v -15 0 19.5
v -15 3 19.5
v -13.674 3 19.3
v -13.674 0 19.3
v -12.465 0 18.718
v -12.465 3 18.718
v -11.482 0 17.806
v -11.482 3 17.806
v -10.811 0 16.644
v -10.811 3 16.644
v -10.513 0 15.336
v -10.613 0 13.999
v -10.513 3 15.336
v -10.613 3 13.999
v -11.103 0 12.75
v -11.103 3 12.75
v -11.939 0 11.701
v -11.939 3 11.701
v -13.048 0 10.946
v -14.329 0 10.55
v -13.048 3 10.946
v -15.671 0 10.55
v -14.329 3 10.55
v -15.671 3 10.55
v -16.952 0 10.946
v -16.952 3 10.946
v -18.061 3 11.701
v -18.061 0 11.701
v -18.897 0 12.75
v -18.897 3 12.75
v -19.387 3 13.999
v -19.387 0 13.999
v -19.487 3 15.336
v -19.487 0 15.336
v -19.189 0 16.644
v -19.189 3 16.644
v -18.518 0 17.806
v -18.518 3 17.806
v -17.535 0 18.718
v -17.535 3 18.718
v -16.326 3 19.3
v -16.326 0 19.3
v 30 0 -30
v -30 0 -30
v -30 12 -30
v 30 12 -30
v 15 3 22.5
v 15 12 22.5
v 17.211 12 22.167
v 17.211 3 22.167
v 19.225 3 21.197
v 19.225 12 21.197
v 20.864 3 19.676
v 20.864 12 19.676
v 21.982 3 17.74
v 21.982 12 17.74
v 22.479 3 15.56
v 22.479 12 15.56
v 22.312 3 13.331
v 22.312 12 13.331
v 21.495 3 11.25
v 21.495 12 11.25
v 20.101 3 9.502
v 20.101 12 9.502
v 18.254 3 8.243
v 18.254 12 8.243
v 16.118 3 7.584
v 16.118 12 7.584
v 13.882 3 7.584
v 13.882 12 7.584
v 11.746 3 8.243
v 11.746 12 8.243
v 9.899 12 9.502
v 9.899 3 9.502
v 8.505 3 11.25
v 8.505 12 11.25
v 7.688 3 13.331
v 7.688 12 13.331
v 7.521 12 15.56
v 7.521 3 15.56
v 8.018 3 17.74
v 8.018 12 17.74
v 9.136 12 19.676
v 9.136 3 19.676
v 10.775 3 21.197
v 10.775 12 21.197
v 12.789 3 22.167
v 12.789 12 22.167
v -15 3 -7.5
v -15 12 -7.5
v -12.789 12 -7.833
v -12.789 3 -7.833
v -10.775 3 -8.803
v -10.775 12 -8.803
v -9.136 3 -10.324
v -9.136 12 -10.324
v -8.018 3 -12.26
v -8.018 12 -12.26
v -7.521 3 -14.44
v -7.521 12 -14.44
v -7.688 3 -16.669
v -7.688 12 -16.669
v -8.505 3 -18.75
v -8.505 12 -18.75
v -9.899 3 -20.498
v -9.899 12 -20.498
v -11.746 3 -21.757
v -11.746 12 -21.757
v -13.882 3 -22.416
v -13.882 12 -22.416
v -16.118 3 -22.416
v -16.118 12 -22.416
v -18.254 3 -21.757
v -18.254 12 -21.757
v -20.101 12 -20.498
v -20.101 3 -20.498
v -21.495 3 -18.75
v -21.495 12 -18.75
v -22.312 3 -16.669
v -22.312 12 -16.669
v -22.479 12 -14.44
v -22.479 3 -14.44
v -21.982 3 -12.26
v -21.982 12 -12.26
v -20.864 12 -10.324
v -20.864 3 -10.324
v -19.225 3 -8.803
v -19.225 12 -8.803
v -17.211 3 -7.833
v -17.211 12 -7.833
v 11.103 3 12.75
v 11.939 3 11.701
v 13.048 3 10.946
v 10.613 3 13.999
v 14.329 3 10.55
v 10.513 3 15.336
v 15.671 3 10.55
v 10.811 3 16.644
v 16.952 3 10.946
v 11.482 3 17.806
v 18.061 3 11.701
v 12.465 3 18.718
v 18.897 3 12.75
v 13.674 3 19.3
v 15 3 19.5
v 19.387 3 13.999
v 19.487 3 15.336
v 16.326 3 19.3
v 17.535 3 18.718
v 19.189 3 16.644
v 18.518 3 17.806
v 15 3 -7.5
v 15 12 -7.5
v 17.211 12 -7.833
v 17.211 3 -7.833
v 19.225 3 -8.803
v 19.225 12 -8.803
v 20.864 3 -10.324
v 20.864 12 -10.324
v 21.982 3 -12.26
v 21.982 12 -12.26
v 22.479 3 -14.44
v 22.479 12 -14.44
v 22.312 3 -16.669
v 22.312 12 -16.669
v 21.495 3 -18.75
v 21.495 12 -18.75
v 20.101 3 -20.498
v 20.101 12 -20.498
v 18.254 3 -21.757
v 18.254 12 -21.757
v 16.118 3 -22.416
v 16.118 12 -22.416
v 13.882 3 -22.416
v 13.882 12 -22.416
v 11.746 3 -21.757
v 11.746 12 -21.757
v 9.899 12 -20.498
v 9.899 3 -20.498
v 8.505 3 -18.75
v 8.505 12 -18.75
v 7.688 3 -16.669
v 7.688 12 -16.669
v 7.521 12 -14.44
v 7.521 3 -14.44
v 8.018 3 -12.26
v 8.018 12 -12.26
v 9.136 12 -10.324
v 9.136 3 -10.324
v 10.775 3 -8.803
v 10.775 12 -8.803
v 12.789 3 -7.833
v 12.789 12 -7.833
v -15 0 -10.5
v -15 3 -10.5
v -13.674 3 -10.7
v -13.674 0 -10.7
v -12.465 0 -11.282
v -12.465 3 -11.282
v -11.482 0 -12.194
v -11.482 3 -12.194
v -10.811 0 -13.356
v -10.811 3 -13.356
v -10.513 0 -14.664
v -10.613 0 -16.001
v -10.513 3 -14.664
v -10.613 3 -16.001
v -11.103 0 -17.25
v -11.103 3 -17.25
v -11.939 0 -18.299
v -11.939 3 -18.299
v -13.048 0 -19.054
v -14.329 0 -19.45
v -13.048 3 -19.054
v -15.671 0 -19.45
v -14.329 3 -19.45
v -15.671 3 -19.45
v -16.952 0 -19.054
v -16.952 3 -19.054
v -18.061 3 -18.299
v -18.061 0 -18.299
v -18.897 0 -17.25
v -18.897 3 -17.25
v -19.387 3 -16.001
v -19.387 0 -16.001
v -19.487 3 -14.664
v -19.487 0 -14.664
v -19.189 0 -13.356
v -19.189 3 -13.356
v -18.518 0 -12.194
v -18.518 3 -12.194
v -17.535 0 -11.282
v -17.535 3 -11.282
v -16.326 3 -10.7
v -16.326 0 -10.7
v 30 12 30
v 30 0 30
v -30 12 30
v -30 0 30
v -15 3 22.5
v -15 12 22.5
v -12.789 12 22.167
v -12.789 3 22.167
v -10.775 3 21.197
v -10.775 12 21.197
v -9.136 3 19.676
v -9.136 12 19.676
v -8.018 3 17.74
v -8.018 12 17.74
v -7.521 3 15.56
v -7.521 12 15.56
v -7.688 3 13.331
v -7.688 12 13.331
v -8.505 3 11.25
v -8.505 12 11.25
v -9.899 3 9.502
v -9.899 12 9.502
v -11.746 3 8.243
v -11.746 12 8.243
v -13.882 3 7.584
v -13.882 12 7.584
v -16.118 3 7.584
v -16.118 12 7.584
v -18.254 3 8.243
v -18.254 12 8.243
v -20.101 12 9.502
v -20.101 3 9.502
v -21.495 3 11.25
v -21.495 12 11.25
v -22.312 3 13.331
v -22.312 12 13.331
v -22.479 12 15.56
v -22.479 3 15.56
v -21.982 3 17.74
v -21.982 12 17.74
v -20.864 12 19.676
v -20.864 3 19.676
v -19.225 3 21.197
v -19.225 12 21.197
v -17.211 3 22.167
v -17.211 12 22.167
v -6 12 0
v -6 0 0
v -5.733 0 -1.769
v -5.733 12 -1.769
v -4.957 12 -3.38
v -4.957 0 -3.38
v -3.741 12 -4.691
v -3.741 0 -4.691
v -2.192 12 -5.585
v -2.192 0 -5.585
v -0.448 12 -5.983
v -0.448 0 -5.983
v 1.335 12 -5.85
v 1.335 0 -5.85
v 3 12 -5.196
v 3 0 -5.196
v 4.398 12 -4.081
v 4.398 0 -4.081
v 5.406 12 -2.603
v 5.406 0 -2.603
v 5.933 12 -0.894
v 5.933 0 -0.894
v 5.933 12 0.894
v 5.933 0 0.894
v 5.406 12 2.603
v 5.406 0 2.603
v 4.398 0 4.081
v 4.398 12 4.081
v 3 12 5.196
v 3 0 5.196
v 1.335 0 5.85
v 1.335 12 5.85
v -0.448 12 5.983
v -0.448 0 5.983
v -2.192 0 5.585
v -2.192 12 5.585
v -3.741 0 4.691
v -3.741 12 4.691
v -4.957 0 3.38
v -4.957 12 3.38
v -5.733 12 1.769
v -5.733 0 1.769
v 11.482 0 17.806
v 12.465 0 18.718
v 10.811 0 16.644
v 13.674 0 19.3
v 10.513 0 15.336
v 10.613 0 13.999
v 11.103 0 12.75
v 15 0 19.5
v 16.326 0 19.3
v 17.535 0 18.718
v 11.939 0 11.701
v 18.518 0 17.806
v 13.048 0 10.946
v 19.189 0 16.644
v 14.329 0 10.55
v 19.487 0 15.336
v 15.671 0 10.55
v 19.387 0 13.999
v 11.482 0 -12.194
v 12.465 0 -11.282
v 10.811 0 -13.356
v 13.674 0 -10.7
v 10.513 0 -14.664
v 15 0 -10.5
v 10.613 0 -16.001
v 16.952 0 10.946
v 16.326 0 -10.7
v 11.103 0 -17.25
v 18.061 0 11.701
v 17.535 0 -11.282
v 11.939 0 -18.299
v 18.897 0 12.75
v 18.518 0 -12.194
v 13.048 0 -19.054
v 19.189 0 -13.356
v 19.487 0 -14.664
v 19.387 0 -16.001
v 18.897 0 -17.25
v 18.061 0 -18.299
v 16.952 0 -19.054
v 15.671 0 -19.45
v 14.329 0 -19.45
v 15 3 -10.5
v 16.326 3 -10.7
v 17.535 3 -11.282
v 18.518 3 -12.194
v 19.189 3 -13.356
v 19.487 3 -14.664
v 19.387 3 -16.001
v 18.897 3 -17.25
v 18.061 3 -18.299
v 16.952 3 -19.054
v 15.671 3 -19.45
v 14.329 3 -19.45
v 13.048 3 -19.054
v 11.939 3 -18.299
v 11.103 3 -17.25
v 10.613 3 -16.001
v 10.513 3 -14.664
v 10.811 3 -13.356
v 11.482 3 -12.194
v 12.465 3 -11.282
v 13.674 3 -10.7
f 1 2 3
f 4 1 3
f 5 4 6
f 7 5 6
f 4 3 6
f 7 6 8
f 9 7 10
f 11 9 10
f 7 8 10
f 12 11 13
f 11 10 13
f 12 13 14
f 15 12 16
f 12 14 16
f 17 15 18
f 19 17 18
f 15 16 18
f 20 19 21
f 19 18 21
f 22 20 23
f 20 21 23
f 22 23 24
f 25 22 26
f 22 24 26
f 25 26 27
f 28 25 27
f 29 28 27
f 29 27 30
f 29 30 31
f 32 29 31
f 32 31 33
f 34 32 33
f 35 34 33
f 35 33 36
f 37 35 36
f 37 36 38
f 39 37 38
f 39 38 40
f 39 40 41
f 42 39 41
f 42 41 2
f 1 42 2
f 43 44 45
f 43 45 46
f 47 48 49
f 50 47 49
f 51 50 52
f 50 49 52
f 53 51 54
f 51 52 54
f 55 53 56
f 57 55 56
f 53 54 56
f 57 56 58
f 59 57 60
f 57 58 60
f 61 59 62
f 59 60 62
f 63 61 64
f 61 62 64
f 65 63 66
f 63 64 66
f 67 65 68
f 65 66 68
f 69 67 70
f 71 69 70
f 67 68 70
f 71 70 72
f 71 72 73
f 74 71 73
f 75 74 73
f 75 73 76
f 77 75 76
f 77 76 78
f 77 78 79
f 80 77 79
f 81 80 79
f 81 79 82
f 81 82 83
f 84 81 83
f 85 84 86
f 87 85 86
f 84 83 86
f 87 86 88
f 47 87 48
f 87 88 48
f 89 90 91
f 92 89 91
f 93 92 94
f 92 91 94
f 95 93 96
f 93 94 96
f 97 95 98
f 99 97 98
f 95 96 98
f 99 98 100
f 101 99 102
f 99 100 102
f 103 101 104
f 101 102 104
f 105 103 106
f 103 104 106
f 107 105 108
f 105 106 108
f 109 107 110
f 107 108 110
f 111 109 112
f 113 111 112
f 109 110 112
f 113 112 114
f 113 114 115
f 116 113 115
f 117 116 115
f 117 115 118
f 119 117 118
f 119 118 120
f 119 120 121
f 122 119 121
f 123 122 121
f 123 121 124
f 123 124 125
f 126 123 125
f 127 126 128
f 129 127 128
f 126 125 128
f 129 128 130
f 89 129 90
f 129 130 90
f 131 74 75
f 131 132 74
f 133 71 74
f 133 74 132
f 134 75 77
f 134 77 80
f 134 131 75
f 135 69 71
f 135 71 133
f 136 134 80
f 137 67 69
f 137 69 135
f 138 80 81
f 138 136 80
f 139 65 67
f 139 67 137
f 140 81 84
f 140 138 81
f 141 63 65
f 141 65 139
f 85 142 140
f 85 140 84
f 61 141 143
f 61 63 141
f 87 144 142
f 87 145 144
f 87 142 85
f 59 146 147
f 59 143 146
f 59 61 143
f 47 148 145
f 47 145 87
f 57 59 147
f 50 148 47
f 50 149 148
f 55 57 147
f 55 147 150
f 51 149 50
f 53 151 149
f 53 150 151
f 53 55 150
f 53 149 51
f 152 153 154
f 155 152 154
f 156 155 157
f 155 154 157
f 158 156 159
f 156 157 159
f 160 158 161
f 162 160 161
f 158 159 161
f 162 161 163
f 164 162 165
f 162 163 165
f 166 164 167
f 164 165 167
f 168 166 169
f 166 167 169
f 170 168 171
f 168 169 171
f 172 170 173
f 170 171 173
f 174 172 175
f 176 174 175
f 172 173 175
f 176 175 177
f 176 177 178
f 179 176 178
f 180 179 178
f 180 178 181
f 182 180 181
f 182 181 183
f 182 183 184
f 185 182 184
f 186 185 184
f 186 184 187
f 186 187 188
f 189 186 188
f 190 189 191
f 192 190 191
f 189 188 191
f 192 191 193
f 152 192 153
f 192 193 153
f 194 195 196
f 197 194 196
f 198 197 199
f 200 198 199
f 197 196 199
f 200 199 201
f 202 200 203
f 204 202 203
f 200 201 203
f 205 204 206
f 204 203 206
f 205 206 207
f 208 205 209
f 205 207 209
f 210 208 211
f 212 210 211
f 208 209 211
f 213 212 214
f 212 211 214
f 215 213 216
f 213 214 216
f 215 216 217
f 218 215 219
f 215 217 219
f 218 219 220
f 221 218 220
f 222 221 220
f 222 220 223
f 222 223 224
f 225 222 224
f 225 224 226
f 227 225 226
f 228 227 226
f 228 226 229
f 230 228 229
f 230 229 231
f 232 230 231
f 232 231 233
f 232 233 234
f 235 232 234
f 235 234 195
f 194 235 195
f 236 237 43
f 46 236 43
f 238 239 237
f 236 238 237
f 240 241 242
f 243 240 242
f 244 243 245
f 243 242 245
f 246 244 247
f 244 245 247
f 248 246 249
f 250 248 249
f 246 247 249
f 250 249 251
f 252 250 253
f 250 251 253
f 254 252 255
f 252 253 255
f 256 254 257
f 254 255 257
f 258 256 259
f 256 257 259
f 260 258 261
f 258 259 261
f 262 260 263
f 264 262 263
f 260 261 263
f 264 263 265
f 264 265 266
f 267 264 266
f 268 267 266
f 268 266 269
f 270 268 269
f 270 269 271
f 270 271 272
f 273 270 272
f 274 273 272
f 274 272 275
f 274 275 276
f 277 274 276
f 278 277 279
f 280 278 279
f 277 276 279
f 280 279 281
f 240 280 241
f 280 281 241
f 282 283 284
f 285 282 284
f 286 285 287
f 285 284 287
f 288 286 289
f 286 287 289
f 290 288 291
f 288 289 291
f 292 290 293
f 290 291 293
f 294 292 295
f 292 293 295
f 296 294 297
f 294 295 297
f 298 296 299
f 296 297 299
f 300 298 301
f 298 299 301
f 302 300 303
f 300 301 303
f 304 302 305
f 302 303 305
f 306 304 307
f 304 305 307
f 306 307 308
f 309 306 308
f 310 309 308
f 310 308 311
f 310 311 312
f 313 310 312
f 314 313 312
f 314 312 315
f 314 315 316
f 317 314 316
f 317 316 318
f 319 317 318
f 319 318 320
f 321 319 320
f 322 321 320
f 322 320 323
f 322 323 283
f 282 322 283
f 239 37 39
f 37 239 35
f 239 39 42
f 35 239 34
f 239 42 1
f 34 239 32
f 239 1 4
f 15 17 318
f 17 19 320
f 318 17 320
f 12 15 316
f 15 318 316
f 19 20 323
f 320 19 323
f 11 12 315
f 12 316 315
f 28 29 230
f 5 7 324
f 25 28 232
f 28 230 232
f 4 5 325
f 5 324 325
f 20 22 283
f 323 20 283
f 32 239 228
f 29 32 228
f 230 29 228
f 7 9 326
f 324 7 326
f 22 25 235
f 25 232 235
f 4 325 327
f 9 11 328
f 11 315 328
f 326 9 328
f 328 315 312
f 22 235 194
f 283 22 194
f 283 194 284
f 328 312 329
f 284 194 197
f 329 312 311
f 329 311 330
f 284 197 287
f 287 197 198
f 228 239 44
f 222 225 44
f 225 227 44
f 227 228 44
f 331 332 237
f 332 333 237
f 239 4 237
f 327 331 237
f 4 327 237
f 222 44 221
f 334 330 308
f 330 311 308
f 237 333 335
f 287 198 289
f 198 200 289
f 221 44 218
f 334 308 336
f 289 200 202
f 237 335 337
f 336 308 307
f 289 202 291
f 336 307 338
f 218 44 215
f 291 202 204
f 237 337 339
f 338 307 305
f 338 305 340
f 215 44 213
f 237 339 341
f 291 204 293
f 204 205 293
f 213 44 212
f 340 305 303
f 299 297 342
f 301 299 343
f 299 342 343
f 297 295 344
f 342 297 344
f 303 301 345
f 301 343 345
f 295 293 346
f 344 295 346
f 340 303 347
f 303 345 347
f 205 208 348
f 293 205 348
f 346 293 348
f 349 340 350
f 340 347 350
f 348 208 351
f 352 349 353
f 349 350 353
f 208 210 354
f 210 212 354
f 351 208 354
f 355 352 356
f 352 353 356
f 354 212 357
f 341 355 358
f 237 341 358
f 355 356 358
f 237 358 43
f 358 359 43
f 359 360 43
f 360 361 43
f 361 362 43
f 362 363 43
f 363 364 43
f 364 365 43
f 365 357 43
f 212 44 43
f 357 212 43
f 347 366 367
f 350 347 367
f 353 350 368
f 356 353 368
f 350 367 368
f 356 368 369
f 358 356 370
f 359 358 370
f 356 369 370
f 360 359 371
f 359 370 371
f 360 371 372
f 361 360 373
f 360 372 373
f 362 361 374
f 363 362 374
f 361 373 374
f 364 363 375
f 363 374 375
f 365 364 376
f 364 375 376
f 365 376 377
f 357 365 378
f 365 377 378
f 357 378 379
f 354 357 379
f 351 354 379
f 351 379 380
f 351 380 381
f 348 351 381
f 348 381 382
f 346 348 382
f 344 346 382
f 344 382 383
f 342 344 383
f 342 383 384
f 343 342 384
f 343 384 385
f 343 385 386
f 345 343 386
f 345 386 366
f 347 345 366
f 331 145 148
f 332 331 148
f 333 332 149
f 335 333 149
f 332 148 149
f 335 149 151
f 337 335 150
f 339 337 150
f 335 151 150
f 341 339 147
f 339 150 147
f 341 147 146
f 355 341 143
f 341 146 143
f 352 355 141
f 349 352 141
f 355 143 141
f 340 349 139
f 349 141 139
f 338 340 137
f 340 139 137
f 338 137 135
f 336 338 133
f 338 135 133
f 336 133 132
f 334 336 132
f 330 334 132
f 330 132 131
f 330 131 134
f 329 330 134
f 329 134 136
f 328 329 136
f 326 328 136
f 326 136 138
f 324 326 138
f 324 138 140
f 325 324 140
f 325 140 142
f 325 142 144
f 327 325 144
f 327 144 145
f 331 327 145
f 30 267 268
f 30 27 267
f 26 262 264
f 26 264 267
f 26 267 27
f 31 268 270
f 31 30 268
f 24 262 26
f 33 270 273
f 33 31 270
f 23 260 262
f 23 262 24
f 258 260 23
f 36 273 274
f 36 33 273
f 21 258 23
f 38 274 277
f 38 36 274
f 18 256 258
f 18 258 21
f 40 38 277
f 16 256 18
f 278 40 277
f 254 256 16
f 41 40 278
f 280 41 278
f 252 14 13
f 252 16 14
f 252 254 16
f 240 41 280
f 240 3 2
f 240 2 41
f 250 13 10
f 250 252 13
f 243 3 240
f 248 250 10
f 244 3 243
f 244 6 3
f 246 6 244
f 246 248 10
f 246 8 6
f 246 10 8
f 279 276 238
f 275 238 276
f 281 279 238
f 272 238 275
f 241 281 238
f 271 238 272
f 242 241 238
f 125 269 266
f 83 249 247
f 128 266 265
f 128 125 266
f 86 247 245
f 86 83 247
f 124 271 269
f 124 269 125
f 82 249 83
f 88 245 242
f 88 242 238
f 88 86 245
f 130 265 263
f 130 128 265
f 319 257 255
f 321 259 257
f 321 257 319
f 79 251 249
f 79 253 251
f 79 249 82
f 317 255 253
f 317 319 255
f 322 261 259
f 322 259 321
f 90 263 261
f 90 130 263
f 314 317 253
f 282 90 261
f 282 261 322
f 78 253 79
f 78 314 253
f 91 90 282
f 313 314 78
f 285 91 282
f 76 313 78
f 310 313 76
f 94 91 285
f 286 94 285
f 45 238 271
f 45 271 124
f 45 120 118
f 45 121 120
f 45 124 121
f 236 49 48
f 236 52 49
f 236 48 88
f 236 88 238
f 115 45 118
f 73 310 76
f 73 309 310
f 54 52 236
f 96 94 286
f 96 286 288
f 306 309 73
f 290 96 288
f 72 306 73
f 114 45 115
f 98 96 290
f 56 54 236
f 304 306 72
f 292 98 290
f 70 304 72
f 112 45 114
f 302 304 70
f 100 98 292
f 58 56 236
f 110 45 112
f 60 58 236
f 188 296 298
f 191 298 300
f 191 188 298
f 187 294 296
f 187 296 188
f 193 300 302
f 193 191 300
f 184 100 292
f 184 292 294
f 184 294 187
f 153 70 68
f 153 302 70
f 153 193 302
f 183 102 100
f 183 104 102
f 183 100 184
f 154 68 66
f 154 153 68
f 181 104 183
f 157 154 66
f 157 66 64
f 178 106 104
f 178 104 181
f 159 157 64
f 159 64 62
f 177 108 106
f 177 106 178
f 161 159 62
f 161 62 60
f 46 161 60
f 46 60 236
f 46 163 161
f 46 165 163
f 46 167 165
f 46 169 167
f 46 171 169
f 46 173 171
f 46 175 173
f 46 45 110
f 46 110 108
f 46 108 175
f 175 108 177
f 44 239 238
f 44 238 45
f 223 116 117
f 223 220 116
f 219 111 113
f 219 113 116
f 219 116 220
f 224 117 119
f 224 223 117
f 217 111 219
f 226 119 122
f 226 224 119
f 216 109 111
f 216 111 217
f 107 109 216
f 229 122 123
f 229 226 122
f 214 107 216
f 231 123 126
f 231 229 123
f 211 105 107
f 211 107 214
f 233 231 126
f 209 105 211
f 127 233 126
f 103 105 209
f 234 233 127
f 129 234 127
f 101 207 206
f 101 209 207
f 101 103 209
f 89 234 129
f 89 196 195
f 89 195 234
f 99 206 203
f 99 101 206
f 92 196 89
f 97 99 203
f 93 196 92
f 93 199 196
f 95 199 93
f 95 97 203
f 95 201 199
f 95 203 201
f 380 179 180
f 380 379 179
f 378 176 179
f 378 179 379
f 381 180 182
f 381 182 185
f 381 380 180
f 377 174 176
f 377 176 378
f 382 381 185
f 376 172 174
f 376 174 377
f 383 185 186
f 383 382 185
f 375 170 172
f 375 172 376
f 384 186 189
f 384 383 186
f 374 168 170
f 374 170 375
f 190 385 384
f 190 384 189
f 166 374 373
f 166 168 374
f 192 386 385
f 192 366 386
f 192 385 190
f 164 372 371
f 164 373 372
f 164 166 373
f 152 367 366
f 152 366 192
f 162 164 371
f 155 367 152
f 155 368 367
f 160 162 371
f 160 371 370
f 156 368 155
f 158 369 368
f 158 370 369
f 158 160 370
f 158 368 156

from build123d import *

# Parameters (mm, degrees)
SKETCH_1_W             = 60
SKETCH_1_H             = 60
EXTRUDE_1_DEPTH        = 12
HOLE_WIZARD_M141_D     = 12
HOLE_WIZARD_M141_DEPTH = 12
SKETCH_12_R            = 4.5
CUT_EXTRUDE_1_DEPTH    = 13
SKETCH_13_R            = 7.5
CUT_EXTRUDE_2_DEPTH    = 9


with BuildPart() as part:
    # Эскиз1 → Бобышка-Вытянуть1 (new body)
    with BuildSketch(Plane(origin=(0, 0, 0), x_dir=(1, 0, 0), z_dir=(0, 1, 0))):
        Rectangle(SKETCH_1_W, SKETCH_1_H)
    extrude(amount=EXTRUDE_1_DEPTH)

    # Отверстие обработанное метчиком M141
    with Locations(Plane(origin=(0, 12, 0), x_dir=(1, 0, 0), z_dir=(0, 1, 0))):
        with Locations((0, 0)):
            Hole(HOLE_WIZARD_M141_D / 2, depth=HOLE_WIZARD_M141_DEPTH)

    # Эскиз12 → Вырез-Вытянуть1 (cut, through all)
    with BuildSketch(Plane(origin=(0, 12, 0), x_dir=(1, 0, 0), z_dir=(0, 1, 0))):
        with Locations(Location((-15, 15, 0), (0, 0, 270))):  # turned: the seam where the file's is
            Circle(SKETCH_12_R)
        with Locations(Location((15, 15, 0), (0, 0, 270))):  # turned: the seam where the file's is
            Circle(SKETCH_12_R)
        with Locations(Location((15, -15, 0), (0, 0, 270))):  # turned: the seam where the file's is
            Circle(SKETCH_12_R)
        with Locations(Location((-15, -15, 0), (0, 0, 270))):  # turned: the seam where the file's is
            Circle(SKETCH_12_R)
    extrude(amount=-CUT_EXTRUDE_1_DEPTH, mode=Mode.SUBTRACT)

    # Эскиз13 → Вырез-Вытянуть2 (cut)
    with BuildSketch(Plane(origin=(0, 12, 0), x_dir=(1, 0, 0), z_dir=(0, 1, 0))):
        with Locations(Location((-15, 15, 0), (0, 0, 270))):  # turned: the seam where the file's is
            Circle(SKETCH_13_R)
        with Locations(Location((15, 15, 0), (0, 0, 270))):  # turned: the seam where the file's is
            Circle(SKETCH_13_R)
        with Locations(Location((15, -15, 0), (0, 0, 270))):  # turned: the seam where the file's is
            Circle(SKETCH_13_R)
        with Locations(Location((-15, -15, 0), (0, 0, 270))):  # turned: the seam where the file's is
            Circle(SKETCH_13_R)
    extrude(amount=-CUT_EXTRUDE_2_DEPTH, mode=Mode.SUBTRACT)


solid = part.part
